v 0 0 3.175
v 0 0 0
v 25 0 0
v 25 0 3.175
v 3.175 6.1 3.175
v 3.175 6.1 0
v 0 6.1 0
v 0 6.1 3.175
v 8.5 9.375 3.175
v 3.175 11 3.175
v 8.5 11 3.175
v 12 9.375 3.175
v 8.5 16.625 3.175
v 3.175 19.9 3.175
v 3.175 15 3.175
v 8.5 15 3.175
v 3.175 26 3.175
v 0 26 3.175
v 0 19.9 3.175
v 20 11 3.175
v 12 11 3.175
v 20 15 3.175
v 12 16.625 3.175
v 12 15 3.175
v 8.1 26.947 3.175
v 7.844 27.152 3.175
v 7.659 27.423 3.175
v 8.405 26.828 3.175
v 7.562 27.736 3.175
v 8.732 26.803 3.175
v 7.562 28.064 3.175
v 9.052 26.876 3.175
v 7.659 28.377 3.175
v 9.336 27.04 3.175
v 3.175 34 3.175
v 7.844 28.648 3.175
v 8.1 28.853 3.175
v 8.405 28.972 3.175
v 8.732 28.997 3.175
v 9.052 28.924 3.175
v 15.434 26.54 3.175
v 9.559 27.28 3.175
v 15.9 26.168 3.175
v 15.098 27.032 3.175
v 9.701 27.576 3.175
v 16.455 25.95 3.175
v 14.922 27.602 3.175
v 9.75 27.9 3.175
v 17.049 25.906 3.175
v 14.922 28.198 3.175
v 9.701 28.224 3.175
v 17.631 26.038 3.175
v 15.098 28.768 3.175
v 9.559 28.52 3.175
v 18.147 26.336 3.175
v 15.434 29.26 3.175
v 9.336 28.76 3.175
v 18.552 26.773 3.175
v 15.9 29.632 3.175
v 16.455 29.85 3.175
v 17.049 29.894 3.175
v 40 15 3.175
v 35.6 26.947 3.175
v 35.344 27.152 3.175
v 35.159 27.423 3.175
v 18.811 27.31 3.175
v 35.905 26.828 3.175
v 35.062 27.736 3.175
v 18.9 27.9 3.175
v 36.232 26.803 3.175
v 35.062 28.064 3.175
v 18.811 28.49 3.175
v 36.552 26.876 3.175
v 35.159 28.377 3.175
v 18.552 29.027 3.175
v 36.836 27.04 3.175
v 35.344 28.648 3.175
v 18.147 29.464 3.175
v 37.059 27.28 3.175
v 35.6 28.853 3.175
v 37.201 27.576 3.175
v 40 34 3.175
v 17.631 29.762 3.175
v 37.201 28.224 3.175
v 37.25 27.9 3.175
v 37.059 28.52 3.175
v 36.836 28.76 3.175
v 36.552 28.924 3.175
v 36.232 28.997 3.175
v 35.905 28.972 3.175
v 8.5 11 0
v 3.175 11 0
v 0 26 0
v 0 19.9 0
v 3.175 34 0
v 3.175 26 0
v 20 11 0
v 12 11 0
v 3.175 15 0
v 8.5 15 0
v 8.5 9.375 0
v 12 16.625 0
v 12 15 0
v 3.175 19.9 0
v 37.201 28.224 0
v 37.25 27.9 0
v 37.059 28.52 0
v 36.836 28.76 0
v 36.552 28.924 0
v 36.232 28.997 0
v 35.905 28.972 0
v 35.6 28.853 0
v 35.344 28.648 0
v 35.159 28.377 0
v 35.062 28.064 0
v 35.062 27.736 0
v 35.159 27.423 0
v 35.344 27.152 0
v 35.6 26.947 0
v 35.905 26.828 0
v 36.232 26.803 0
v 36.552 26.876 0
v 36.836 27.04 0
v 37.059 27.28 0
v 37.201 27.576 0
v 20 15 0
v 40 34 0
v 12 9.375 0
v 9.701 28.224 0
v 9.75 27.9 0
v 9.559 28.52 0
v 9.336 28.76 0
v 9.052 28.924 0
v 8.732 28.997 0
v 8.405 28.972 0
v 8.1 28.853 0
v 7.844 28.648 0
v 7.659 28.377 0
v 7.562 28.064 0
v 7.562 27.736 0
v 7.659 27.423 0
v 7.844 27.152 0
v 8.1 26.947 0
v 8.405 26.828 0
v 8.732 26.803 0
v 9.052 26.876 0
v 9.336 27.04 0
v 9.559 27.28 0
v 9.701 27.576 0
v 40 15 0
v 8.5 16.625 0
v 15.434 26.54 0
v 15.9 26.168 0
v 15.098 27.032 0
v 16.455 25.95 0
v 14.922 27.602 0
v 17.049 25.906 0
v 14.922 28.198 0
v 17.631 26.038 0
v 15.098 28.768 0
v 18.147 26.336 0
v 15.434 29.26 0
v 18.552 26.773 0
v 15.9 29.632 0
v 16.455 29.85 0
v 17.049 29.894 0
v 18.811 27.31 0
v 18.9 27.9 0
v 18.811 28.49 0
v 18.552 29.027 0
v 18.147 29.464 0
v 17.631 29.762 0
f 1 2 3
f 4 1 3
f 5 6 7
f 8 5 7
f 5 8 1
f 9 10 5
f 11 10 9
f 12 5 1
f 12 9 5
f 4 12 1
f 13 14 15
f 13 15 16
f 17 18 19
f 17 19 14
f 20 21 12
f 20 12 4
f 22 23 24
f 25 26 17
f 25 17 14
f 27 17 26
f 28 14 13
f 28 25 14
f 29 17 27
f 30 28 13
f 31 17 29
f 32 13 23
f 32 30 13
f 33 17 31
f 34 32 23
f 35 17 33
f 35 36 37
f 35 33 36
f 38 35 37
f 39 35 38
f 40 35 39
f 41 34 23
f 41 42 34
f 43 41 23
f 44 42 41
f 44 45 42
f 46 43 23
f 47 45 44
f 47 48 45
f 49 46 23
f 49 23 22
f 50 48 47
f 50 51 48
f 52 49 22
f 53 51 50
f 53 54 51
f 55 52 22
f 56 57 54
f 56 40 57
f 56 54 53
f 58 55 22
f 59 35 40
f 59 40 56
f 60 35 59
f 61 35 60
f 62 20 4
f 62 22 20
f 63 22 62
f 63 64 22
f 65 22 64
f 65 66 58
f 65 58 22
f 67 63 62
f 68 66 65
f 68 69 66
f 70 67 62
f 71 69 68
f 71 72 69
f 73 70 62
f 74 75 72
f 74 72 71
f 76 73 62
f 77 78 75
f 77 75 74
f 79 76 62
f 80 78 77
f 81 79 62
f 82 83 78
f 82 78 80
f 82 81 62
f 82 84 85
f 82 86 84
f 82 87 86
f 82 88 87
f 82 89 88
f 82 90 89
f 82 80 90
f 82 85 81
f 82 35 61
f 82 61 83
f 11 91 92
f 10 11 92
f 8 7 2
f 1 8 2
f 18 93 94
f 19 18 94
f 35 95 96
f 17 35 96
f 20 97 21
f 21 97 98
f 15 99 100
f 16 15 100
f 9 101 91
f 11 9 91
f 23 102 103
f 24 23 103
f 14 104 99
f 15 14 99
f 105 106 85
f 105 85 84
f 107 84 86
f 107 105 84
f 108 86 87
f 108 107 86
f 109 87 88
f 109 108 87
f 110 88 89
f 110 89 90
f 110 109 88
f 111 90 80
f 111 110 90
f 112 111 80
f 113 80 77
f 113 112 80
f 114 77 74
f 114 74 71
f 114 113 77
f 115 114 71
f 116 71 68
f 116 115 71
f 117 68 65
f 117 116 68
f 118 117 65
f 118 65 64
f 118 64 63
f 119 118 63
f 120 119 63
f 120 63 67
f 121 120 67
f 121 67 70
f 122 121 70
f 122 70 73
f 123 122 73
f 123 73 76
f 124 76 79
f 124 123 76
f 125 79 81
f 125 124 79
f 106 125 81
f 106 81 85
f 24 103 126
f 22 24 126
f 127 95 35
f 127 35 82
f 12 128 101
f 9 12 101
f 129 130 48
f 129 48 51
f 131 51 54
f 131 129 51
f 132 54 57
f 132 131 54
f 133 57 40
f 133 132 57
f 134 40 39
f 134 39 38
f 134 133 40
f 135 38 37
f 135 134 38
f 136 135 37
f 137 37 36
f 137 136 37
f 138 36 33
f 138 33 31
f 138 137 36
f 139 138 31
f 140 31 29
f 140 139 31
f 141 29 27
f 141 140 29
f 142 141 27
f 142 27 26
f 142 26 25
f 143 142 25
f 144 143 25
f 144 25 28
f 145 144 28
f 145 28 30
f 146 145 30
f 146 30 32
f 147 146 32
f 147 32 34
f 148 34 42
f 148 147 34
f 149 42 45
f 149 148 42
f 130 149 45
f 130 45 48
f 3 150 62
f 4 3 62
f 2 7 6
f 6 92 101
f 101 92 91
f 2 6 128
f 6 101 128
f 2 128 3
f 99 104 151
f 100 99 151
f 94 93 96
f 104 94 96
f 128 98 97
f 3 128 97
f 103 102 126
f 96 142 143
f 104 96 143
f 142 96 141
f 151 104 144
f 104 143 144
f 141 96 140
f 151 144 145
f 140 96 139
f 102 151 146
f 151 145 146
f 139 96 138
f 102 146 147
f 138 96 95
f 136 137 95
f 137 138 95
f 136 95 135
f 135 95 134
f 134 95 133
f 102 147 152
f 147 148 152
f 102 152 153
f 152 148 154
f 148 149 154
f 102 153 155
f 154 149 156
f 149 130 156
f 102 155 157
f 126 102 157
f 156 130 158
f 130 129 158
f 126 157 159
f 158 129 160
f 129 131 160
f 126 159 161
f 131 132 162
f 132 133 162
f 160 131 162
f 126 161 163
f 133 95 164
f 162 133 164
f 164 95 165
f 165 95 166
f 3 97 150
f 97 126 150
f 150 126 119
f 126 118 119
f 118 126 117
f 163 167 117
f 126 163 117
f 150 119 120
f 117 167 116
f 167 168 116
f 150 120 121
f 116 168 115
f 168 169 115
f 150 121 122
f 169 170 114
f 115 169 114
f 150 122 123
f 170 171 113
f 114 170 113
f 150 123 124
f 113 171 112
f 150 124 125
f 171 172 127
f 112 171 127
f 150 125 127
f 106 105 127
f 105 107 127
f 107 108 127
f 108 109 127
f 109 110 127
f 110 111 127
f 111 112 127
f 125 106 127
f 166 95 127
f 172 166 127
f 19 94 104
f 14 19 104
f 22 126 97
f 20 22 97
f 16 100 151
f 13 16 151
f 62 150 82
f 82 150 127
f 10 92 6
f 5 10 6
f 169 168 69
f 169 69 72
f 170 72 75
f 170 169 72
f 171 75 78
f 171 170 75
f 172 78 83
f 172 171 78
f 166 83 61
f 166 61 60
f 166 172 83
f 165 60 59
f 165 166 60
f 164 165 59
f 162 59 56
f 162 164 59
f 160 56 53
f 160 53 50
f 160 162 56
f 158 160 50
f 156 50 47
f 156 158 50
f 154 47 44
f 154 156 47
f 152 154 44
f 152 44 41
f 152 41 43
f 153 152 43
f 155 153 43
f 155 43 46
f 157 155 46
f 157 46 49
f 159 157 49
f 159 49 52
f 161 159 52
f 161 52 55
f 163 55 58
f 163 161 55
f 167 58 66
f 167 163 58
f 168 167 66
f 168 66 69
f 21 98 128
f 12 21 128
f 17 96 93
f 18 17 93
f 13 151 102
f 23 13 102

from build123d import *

# Parameters (mm, degrees)
SKETCH1_R           = 1.1
SKETCH1_W           = 23.2
SKETCH1_H           = 12.2
SKETCH1_R_2         = 2
BOSS_EXTRUDE1_DEPTH = 3.175
CHAMFER1_SIZE       = 15


with BuildPart() as part:
    # Sketch1 → Boss-Extrude1 (new body)
    # profile 1 of 3: a face of its own
    with BuildSketch(Plane.XY):
        Polygon((10.8, 21.8), (10.8, 34), (3.175, 34), (3.175, 26), (0, 26), (0, 19.9), (3.175, 19.9), (3.175, 17), (40, 17), (40, 34), (34, 34), (34, 21.8), align=None)
        with Locations((8.65, 27.9)):
            Circle(SKETCH1_R, mode=Mode.SUBTRACT)
        with Locations((36.15, 27.9)):
            Circle(SKETCH1_R, mode=Mode.SUBTRACT)
    # profile 2 of 3: a face of its own
    with BuildSketch(Plane.XY):
        Polygon((40, 0), (40, 17), (3.175, 17), (3.175, 15), (8.5, 15), (8.5, 16.625), (12, 16.625), (12, 15), (20, 15), (20, 11), (12, 11), (12, 9.375), (8.5, 9.375), (8.5, 11), (3.175, 11), (3.175, 6.1), (0, 6.1), (0, 0), align=None)
    # profile 3 of 3: a face of its own
    with BuildSketch(Plane.XY):
        with Locations((22.4, 27.9)):
            Rectangle(SKETCH1_W, SKETCH1_H)
        with Locations((16.9, 27.9)):
            Circle(SKETCH1_R_2, mode=Mode.SUBTRACT)
    extrude(amount=BOSS_EXTRUDE1_DEPTH)

    # Chamfer1
    chamfer1_edges = [part.edges().sort_by_distance(p)[0] for p in [
        (40, 0, 1.5875),
    ]]
    chamfer(chamfer1_edges, length=CHAMFER1_SIZE)


solid = part.part
